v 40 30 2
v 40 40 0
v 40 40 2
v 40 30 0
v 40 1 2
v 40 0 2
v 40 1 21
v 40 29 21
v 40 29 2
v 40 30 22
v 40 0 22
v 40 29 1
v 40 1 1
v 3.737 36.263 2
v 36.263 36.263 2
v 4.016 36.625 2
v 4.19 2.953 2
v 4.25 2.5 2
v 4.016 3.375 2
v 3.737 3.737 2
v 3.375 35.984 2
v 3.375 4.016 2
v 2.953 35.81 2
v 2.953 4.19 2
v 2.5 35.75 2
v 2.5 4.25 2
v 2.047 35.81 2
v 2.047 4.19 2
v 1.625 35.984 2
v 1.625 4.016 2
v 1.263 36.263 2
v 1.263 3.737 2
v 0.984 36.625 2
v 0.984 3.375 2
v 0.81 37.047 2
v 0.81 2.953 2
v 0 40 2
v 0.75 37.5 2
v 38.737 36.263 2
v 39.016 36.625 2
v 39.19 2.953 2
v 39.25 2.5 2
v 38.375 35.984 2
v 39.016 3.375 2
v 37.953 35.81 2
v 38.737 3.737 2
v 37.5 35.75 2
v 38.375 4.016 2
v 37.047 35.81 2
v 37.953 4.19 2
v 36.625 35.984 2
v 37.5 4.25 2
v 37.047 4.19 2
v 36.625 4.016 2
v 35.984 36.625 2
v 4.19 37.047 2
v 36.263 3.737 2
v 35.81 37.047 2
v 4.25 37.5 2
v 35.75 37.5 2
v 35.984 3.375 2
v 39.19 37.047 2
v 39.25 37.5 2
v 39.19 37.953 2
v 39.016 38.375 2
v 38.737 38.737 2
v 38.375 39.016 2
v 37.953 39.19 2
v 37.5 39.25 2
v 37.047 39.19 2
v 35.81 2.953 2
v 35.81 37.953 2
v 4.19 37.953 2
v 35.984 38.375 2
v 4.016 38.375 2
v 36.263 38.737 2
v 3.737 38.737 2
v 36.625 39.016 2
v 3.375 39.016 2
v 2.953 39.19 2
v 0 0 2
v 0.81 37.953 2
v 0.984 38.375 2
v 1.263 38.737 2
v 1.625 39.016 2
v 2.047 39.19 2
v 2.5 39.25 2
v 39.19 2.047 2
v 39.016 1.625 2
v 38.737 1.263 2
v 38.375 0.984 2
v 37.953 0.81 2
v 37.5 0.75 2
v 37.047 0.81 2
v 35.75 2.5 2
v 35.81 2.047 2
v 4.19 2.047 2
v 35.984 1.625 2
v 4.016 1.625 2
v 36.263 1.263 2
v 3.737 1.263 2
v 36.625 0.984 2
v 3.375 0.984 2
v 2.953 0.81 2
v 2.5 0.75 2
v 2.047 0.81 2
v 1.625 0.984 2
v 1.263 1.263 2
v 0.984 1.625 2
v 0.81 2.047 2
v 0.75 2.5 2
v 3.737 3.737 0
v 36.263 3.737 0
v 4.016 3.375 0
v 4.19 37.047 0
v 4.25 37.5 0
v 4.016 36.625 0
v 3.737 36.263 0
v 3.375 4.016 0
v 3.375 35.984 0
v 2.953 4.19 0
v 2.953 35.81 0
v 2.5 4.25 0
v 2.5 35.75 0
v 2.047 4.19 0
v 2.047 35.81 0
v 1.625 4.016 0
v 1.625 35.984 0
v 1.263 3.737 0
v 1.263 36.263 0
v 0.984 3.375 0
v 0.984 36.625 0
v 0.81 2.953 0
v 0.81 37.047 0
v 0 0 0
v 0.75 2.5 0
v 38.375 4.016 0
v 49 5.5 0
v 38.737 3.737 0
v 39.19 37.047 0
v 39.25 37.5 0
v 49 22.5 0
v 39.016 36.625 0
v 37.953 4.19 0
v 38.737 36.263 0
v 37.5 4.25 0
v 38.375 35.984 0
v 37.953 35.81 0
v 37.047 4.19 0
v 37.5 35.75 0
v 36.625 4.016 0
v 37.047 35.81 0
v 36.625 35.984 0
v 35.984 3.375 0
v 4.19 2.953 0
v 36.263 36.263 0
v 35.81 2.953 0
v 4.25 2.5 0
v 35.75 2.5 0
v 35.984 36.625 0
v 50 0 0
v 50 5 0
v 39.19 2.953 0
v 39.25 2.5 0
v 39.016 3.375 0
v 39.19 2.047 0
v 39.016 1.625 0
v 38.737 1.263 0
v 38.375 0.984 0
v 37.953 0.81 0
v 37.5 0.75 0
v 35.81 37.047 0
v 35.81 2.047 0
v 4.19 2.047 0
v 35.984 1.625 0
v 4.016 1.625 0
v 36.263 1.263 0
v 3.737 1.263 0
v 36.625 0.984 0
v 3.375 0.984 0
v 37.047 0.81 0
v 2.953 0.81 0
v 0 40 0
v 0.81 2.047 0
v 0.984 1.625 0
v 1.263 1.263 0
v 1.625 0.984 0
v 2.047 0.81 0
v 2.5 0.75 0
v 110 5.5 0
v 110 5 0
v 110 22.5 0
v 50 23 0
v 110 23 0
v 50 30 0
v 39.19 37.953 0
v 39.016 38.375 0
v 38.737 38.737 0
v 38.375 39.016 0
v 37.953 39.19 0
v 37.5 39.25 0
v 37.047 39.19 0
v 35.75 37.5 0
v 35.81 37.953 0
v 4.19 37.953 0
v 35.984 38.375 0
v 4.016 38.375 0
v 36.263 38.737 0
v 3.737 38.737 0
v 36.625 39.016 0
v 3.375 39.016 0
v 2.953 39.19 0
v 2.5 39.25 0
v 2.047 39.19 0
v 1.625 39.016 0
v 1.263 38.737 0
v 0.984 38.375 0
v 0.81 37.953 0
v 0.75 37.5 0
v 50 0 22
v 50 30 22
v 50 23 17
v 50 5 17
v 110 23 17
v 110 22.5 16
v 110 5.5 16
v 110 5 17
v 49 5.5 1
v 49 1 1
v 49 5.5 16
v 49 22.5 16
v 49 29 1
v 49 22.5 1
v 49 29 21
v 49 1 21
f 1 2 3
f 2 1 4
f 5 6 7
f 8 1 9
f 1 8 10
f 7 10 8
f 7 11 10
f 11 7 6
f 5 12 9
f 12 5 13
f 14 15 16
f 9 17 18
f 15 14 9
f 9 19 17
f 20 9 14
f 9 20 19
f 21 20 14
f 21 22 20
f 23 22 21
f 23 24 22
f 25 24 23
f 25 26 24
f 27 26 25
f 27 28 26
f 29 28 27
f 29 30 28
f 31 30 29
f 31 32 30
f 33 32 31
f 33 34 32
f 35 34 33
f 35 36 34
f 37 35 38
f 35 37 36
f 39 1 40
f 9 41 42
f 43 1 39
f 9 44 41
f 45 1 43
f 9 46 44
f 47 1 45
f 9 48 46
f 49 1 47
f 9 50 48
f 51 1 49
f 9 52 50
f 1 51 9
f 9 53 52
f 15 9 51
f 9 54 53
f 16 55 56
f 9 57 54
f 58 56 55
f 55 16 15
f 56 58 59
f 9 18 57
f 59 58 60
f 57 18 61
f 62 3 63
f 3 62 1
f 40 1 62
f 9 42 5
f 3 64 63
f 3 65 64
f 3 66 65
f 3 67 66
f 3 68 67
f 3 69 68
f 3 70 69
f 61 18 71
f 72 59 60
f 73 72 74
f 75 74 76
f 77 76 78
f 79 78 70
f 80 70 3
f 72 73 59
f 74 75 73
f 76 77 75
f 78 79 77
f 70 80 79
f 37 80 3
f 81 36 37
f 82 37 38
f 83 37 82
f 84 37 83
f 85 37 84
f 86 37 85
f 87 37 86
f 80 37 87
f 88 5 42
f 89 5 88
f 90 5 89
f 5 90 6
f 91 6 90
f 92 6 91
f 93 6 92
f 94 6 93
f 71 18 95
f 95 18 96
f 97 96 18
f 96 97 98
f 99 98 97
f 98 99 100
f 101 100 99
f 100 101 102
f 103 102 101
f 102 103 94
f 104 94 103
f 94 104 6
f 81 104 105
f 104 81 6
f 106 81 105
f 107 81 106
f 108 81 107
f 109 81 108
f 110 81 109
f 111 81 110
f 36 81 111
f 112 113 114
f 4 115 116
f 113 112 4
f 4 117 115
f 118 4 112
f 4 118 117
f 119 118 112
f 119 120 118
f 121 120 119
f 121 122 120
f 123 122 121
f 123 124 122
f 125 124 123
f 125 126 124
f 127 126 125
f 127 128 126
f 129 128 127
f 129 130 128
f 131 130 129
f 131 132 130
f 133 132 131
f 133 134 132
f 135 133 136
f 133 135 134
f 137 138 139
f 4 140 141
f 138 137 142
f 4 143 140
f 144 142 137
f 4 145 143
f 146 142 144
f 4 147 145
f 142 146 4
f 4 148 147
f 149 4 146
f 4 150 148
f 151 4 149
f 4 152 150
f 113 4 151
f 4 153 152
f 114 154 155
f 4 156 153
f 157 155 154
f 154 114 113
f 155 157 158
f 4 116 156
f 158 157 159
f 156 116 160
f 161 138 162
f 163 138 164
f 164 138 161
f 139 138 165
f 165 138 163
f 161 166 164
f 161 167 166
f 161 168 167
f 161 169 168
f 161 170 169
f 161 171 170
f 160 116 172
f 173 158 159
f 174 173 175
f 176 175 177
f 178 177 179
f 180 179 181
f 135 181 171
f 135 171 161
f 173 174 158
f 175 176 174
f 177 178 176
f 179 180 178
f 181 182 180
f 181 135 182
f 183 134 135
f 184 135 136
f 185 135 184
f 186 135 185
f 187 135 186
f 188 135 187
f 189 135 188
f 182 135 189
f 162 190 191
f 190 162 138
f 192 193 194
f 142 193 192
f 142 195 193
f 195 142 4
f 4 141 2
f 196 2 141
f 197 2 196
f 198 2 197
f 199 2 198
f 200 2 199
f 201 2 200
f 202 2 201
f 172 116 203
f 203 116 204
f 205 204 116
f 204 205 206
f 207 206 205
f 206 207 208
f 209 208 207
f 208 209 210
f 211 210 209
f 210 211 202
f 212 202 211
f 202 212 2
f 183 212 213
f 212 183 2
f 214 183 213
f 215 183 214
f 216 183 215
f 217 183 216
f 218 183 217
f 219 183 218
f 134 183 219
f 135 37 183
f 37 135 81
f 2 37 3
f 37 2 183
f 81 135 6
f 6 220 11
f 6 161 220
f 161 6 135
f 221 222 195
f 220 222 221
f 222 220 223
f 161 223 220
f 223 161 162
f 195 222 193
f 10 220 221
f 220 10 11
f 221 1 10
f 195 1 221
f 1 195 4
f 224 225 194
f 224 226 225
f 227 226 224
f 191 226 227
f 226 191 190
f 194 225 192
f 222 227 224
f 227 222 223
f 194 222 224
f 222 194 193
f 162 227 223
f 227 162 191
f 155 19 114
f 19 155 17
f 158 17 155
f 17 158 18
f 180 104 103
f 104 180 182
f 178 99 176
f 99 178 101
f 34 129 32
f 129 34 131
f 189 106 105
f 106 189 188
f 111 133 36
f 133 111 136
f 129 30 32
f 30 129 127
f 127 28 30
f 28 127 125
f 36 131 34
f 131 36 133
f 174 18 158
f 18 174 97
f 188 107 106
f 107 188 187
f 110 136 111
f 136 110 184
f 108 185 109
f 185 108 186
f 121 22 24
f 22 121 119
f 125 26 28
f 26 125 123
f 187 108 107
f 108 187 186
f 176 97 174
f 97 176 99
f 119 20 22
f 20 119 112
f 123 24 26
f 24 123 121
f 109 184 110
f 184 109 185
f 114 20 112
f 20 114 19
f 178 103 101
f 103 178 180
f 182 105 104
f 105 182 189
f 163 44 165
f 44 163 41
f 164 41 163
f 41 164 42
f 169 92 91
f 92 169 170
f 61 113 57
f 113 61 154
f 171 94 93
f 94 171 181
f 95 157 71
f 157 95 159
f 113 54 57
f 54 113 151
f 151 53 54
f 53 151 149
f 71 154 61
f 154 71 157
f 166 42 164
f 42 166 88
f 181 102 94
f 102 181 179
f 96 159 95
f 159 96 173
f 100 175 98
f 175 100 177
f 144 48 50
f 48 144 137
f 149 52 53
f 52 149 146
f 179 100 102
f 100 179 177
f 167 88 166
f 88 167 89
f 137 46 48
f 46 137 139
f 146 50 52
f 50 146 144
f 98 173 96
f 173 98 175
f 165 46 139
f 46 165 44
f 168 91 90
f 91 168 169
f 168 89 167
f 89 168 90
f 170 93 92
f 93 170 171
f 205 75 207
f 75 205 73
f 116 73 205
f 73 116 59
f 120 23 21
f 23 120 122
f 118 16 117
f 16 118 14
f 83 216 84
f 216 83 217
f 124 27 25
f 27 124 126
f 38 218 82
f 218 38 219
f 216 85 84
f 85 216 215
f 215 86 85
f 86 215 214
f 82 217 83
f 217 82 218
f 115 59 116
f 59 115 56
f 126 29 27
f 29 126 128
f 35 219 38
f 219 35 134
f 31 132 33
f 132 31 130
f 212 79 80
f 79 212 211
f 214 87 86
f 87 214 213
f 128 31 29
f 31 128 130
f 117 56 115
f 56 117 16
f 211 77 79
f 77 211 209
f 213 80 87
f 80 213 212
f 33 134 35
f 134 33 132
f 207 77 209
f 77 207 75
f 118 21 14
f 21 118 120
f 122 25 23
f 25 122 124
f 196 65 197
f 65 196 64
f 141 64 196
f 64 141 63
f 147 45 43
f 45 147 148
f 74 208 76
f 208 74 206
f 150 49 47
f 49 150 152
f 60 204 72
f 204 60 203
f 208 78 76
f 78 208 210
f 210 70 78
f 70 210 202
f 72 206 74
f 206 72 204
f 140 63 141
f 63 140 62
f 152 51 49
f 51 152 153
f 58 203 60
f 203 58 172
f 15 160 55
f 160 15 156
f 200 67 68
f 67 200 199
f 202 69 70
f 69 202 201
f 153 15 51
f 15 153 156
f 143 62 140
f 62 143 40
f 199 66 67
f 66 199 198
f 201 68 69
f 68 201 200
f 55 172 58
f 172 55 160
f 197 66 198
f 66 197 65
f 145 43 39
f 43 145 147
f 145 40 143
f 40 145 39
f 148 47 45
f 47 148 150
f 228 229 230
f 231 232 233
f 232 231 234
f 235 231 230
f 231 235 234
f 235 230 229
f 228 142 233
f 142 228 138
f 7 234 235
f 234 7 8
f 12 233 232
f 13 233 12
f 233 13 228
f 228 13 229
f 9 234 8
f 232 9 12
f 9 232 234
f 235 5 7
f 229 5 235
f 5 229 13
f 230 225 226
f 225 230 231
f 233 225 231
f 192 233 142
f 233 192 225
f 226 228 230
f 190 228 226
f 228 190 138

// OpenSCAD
difference()
{
    union()
    {
        cube([40,40,2]);
        
        translate([40,0,0])
            cube([10,30,22]);
        
        translate([50,5,0])
            cube([60,18,17]);
    }
    union()
    {
        translate([2.5,2.5,0])
            cylinder(d=3.5,h=4,$fn=24);
        translate([40-2.5,2.5,0])
            cylinder(d=3.5,h=4,$fn=24);
        translate([2.5,40-2.5,0])
            cylinder(d=3.5,h=4,$fn=24);
        translate([40-2.5,40-2.5,0])
            cylinder(d=3.5,h=4,$fn=24);
        
        translate([40,1,1])
            cube([9,30-2,22-2]);
        
        translate([50-1,5+.5,0])
            cube([70,18-1,17-1]);
    }
}
